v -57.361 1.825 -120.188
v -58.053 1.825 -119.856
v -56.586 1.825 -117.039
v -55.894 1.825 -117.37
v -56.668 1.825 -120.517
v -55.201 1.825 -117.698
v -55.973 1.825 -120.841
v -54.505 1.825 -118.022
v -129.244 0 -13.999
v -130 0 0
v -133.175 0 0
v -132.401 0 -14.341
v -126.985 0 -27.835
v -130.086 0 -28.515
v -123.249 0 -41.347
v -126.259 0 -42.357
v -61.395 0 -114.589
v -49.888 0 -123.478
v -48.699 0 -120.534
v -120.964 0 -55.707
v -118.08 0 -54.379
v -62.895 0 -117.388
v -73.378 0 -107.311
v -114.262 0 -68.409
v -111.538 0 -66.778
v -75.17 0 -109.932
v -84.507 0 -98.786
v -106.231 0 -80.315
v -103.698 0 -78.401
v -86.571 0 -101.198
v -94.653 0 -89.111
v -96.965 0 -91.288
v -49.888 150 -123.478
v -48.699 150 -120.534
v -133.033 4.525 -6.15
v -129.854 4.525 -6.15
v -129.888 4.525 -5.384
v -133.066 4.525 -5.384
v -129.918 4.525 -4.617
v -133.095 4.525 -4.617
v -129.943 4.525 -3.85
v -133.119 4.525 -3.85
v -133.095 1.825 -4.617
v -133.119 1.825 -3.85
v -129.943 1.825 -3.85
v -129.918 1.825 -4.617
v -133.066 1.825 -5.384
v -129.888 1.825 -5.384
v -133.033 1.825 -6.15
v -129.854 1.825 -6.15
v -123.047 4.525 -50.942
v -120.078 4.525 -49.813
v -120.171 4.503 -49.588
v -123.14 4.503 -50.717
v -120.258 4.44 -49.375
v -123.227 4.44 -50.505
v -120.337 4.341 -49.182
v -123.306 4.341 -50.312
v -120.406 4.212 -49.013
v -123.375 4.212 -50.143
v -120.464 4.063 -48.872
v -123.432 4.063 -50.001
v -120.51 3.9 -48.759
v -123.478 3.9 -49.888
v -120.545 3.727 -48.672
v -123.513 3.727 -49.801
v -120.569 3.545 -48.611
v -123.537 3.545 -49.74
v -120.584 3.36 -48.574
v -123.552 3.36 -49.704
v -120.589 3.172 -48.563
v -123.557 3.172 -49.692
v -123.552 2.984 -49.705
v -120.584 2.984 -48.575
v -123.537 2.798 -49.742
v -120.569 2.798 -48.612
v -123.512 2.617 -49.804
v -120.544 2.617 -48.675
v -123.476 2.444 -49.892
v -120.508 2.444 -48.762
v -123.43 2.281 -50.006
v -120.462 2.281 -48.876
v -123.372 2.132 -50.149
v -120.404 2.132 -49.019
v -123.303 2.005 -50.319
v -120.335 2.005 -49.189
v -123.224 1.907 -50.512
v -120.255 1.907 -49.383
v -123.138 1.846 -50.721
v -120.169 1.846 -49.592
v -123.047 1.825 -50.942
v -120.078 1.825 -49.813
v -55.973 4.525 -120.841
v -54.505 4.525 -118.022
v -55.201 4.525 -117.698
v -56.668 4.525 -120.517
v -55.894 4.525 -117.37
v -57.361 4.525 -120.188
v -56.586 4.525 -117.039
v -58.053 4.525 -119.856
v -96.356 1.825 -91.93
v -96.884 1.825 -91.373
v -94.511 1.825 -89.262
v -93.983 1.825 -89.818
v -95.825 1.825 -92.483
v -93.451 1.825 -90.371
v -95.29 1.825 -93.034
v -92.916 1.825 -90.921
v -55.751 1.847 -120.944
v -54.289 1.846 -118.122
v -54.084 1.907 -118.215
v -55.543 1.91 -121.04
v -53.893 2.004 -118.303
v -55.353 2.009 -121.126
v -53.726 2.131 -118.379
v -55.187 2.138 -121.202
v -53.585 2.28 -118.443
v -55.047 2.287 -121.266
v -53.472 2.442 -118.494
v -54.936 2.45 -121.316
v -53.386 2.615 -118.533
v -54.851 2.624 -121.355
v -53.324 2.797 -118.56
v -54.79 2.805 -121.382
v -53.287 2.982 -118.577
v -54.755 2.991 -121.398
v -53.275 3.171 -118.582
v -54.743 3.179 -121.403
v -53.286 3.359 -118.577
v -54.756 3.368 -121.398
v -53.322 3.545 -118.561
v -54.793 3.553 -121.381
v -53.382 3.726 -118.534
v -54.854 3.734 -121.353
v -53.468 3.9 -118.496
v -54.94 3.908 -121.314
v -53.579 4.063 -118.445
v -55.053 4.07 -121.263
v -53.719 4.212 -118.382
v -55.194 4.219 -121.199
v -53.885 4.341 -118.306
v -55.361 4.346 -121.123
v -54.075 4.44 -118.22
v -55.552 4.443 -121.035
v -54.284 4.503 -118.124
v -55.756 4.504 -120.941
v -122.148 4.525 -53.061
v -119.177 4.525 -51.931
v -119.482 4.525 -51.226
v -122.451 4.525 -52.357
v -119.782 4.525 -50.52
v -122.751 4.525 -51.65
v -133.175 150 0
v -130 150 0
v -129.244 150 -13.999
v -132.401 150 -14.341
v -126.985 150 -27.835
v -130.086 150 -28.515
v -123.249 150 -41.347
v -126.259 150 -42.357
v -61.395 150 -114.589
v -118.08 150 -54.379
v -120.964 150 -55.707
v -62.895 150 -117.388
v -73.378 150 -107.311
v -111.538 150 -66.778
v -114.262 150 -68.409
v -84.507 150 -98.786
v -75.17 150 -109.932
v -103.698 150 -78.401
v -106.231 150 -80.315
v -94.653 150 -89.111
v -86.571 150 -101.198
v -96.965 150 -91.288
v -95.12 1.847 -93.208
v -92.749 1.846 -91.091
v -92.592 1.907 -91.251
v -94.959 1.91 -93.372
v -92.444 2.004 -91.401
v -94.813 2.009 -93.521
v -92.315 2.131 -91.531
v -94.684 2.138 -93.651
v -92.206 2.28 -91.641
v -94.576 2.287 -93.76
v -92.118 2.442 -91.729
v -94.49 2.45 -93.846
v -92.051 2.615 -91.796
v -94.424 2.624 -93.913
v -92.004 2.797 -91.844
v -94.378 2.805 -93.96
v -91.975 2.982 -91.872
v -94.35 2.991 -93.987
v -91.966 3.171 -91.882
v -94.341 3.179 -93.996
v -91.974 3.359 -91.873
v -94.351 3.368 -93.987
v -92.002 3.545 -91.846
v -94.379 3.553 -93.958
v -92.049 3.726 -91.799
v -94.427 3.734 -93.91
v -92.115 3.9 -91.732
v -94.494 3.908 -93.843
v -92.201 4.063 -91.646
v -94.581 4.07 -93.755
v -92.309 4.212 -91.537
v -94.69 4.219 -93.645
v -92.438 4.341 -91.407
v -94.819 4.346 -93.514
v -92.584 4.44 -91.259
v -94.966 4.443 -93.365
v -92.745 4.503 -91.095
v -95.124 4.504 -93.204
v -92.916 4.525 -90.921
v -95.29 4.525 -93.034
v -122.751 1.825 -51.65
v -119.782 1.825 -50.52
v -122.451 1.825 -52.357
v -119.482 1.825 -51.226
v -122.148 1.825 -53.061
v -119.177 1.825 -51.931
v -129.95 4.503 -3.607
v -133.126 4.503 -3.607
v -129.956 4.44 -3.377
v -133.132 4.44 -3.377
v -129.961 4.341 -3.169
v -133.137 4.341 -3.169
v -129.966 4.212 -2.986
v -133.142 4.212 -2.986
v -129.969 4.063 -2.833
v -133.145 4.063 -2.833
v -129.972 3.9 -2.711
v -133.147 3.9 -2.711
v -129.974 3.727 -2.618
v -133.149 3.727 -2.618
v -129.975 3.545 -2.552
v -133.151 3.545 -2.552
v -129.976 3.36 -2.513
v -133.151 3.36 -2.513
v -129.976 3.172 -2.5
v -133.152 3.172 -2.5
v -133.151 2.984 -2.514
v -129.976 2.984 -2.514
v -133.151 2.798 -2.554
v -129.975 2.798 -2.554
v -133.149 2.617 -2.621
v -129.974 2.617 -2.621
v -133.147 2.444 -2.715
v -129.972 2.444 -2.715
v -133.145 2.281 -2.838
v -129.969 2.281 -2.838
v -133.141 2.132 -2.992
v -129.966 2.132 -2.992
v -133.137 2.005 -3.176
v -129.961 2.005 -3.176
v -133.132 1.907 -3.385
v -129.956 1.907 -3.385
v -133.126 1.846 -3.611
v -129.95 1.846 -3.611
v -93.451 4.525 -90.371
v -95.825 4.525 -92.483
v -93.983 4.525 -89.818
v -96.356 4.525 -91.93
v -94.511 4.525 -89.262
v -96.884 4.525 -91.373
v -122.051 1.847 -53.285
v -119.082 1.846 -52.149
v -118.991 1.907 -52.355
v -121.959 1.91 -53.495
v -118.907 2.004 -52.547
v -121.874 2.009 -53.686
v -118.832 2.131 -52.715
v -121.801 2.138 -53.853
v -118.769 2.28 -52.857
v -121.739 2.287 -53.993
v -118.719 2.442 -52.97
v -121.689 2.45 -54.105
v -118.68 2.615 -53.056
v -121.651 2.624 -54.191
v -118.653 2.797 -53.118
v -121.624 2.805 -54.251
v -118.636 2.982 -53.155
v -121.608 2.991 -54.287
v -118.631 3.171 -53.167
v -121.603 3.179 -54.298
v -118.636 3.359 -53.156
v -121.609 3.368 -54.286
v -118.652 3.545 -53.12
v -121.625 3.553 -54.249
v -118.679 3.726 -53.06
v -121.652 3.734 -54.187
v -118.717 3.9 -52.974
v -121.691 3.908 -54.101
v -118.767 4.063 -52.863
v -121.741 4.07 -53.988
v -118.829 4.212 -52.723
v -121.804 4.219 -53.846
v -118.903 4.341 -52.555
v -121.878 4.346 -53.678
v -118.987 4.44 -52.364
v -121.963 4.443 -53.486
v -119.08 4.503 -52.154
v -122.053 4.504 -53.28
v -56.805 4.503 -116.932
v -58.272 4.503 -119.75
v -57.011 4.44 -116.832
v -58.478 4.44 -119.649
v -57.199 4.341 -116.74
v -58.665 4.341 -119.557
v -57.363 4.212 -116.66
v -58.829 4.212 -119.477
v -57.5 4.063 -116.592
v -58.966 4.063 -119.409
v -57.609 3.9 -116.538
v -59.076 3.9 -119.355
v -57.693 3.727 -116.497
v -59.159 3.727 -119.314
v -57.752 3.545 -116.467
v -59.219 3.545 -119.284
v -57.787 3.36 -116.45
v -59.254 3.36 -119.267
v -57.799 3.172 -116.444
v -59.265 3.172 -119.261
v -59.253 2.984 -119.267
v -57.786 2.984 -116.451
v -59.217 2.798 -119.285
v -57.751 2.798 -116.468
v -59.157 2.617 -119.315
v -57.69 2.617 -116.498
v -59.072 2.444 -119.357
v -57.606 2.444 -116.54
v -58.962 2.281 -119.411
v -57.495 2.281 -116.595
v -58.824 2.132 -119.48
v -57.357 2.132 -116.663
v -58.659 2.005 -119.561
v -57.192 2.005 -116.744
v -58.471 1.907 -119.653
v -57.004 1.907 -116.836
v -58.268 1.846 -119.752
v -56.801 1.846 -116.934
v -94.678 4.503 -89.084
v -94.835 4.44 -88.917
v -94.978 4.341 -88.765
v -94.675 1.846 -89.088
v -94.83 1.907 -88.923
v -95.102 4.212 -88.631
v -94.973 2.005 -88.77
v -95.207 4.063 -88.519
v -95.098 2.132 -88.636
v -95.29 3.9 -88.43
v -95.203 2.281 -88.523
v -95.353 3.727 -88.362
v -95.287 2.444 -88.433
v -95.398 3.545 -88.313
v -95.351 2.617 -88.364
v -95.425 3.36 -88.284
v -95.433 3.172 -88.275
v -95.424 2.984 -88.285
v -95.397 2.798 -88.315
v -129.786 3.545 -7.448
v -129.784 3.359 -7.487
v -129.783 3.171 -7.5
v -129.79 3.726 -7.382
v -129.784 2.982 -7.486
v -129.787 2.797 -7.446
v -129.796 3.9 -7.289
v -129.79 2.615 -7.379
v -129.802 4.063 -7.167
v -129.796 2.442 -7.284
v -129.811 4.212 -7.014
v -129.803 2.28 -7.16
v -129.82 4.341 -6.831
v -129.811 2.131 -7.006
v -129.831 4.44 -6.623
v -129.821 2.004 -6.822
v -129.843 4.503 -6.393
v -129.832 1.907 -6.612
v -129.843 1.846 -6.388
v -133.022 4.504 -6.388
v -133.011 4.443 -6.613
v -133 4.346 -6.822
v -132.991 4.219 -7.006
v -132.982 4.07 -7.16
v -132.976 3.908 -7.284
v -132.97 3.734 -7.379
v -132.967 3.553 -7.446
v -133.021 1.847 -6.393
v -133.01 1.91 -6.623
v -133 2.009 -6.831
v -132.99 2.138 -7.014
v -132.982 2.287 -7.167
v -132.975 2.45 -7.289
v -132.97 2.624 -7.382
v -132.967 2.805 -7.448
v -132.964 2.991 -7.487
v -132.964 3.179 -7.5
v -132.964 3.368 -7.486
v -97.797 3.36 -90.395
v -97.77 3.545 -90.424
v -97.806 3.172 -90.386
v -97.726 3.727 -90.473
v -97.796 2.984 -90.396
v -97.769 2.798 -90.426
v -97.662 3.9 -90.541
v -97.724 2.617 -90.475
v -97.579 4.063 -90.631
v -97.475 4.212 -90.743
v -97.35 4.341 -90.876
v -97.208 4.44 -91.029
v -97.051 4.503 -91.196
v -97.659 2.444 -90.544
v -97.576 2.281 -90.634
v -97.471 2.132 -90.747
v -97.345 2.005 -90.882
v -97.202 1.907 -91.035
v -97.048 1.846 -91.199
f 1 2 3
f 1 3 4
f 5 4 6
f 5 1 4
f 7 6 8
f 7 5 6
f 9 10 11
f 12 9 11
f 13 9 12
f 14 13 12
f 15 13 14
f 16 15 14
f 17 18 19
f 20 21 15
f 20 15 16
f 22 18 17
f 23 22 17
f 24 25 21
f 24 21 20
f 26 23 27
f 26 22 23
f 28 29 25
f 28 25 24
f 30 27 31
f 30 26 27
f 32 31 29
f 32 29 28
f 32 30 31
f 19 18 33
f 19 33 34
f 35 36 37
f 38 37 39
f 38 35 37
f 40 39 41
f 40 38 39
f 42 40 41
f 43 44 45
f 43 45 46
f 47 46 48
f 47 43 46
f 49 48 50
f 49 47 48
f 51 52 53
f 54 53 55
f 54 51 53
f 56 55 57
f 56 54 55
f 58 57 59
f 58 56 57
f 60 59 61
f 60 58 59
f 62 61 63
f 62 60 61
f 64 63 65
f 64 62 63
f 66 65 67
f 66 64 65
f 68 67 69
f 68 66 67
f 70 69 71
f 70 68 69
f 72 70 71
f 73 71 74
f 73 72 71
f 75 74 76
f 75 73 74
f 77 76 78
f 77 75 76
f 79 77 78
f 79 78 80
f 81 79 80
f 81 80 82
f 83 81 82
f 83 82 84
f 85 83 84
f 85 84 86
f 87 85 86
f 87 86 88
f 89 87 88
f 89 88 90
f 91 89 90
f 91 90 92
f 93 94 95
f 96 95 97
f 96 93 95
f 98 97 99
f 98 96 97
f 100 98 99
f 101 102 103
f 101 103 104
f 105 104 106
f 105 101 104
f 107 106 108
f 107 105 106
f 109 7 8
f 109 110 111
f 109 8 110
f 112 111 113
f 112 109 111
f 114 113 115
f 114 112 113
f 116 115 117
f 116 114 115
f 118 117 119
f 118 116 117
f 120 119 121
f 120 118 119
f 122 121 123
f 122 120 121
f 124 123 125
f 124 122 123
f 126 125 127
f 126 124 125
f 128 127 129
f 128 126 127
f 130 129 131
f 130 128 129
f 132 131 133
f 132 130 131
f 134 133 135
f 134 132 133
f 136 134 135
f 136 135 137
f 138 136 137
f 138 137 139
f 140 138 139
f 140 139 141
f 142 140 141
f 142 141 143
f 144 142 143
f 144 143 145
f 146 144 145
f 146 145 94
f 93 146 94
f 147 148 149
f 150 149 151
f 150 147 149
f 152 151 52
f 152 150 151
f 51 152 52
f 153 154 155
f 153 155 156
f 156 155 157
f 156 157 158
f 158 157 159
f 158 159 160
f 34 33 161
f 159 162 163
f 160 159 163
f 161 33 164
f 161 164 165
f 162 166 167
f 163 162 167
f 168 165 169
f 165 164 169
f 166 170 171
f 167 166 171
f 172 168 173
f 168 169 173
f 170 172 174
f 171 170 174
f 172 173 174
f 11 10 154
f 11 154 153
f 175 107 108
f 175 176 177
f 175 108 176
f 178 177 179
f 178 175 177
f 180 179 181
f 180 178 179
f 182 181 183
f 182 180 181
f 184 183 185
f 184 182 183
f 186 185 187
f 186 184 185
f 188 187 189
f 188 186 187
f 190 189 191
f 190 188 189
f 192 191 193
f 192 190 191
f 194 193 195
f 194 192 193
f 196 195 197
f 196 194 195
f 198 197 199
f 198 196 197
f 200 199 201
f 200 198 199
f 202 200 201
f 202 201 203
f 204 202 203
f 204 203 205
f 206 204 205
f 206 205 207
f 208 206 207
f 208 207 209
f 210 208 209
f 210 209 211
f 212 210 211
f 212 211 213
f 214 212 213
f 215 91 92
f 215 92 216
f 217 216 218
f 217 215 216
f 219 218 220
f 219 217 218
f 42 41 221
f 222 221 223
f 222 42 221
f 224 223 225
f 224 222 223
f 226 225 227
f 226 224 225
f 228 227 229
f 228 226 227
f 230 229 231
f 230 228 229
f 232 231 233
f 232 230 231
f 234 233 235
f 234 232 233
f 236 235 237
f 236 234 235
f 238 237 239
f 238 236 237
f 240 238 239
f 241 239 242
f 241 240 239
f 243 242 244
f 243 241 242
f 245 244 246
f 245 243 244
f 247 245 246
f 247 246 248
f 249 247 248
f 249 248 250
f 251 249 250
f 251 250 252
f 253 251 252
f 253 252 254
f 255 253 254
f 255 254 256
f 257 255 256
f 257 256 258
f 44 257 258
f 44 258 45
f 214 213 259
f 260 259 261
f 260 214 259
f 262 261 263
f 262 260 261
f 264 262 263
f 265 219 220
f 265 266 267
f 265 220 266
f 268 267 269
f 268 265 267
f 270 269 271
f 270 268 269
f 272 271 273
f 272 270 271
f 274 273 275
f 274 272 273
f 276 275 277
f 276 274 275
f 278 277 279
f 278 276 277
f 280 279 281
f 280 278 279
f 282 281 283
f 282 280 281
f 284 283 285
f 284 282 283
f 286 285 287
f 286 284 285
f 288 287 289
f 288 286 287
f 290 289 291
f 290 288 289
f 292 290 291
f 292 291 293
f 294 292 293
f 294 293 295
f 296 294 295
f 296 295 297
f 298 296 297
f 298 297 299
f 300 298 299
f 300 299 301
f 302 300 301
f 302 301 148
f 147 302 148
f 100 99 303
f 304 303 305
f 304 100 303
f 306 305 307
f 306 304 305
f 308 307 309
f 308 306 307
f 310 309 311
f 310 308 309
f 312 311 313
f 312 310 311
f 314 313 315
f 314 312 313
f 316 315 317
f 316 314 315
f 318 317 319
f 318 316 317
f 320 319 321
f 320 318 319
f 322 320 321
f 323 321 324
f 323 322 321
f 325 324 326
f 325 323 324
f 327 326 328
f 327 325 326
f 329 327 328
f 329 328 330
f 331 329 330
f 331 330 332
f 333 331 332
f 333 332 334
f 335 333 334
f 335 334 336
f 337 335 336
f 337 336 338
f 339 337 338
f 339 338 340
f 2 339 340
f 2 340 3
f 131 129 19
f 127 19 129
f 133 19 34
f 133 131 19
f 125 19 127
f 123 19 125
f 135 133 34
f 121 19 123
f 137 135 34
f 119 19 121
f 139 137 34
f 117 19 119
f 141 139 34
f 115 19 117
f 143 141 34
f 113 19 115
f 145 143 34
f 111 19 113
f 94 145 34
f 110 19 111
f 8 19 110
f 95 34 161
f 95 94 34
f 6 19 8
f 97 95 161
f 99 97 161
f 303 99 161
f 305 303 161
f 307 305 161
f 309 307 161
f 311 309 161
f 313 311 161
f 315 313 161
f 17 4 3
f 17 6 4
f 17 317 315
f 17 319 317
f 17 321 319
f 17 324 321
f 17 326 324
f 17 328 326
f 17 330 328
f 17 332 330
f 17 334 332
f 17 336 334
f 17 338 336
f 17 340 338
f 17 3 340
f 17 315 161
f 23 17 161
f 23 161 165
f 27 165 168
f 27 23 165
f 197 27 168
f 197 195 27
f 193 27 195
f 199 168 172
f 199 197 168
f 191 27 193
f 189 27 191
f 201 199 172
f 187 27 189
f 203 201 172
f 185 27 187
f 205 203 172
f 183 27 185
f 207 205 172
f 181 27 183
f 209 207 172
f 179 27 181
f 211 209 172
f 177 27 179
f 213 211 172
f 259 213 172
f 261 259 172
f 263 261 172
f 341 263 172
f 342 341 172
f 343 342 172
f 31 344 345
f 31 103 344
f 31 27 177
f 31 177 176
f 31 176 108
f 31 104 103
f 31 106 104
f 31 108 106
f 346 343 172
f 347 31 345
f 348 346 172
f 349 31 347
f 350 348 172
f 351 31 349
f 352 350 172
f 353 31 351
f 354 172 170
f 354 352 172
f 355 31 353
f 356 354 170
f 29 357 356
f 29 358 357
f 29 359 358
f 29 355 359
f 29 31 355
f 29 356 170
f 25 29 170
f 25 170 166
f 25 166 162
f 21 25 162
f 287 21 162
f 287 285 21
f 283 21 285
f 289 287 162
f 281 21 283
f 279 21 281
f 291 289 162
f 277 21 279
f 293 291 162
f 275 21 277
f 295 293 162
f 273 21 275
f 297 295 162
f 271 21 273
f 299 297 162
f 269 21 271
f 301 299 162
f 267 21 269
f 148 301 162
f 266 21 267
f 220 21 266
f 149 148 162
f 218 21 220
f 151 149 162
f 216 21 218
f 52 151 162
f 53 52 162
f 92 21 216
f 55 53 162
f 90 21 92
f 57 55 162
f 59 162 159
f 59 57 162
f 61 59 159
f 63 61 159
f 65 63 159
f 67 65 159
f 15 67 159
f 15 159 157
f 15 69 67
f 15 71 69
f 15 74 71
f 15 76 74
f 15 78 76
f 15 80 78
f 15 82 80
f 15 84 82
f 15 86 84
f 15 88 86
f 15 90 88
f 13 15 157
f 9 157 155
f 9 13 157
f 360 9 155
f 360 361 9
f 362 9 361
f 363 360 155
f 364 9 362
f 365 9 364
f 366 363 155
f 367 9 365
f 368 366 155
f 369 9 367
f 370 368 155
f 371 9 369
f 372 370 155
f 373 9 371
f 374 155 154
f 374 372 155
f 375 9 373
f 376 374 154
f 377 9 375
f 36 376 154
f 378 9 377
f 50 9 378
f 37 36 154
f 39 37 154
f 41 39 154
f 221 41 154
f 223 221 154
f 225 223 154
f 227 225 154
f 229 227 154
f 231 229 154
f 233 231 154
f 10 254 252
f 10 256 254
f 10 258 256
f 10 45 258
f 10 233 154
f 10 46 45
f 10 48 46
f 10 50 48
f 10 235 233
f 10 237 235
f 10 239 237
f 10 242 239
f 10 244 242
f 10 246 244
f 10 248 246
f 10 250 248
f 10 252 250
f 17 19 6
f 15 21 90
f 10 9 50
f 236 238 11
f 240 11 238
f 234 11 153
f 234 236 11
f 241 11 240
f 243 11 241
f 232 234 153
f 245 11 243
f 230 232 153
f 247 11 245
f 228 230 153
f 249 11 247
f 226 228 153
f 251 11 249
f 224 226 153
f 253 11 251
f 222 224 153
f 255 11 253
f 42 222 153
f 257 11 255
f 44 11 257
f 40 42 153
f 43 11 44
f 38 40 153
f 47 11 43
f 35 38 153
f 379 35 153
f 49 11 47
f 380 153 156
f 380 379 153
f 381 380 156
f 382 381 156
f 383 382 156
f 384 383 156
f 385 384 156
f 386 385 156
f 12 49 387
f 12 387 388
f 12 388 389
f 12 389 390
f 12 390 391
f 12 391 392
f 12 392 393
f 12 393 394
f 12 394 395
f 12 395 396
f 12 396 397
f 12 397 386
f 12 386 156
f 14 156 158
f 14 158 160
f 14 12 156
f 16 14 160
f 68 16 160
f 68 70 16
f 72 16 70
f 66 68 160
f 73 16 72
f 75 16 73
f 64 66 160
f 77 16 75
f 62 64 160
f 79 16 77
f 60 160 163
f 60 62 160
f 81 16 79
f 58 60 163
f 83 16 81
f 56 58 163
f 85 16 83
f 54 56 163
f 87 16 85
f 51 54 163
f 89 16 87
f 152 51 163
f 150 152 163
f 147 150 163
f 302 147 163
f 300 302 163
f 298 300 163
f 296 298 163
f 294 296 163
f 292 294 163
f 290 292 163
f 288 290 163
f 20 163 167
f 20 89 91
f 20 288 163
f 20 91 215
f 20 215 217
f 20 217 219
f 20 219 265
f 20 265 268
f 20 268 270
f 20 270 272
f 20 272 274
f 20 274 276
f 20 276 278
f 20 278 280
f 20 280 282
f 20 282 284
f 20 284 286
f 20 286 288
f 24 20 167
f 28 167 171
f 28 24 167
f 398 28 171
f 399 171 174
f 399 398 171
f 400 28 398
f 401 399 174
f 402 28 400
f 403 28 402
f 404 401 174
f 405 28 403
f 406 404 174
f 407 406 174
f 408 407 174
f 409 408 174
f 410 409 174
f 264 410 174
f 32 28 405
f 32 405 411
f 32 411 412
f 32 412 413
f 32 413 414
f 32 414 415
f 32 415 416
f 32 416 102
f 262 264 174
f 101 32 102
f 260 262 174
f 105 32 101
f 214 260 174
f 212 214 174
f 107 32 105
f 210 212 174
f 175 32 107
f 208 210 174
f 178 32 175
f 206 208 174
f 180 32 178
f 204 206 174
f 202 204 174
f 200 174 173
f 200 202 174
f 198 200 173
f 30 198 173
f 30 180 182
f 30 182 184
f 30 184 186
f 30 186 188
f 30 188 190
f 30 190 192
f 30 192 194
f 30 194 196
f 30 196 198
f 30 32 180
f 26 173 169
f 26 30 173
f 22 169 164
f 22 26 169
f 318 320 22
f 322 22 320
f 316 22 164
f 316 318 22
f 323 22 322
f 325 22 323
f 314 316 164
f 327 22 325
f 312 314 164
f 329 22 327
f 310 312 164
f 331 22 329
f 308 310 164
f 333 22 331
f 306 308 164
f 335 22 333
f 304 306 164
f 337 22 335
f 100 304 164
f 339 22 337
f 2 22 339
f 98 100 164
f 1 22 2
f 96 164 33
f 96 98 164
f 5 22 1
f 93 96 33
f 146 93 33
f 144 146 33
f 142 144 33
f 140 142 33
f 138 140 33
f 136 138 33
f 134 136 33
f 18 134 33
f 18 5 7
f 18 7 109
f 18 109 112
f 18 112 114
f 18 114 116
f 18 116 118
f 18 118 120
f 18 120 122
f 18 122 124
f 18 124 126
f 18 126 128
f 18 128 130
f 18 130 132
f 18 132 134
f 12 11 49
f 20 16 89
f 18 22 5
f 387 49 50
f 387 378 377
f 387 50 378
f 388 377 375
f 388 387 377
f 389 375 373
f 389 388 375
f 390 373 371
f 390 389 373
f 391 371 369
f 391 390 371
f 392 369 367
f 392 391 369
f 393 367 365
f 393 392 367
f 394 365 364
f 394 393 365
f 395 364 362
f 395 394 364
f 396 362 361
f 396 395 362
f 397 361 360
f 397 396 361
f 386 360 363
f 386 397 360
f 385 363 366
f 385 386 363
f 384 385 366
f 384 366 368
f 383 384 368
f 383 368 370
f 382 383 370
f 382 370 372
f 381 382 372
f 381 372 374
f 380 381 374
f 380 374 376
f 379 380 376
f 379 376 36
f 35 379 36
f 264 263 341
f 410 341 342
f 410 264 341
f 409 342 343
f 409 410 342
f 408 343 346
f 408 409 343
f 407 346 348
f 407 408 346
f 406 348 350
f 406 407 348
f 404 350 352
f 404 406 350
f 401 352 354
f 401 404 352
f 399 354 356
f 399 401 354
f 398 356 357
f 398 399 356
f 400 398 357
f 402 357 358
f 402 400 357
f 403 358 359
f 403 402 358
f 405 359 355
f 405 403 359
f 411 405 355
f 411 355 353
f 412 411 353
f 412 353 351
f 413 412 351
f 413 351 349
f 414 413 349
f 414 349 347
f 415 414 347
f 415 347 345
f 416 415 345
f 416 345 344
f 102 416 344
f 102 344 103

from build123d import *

# Parameters (mm, degrees)
BOSS_EXTRUDE1_DEPTH        = 150
M2_5_START                 = -133.151532693
M2_5_CLEARANCE_SLOT1_DEPTH = 3.368059081
CIRPATTERN1_COUNT          = 4
CIRPATTERN1_ANGLE          = 62.5


# Read off the part's stored shape, not the designer's step: M2.5 Clearance Slot1
with BuildPart() as part:
    # Sketch1 → Boss-Extrude1 (new body)
    with BuildSketch(Plane(origin=(0, 0, 0), x_dir=(1, 0, 0), z_dir=(0, 1, 0))):
        with BuildLine():
            Line((-130, 0), (-133.175, 0))
            ThreePointArc((-133.175, 0), (-110.407078725, 74.47051492), (-49.888233078, 123.477709832))
            Line((-49.888233078, 123.477709832), (-48.698857144, 120.533901094))
            ThreePointArc((-48.698857144, 120.533901094), (-107.774884432, 72.695077451), (-130, 0))
        make_face()
    extrude(amount=BOSS_EXTRUDE1_DEPTH)

    # M2.5 Clearance Slot1 outline → M2.5 Clearance Slot1 (cut)
    with BuildSketch(Plane.YZ.offset(M2_5_START)):
        with BuildLine():
            ThreePointArc((1.825, -6.15), (3.175, -7.5), (4.525, -6.15))
            Line((4.525, -6.15), (4.525, -3.85))
            ThreePointArc((4.525, -3.85), (3.175, -2.5), (1.825, -3.85))
            Line((1.825, -3.85), (1.825, -6.15))
        make_face()
    m2_5_clearance_slot1 = extrude(amount=M2_5_CLEARANCE_SLOT1_DEPTH, mode=Mode.SUBTRACT)

    # CirPattern1: M2.5 Clearance Slot1 ×4 about axis
    cirpattern1_axis = Axis((0, 150, 0), (0, -1, 0))
    for i in range(1, CIRPATTERN1_COUNT):
        add(m2_5_clearance_slot1.rotate(cirpattern1_axis, i * CIRPATTERN1_ANGLE / (CIRPATTERN1_COUNT - 1)), mode=Mode.SUBTRACT)


solid = part.part
